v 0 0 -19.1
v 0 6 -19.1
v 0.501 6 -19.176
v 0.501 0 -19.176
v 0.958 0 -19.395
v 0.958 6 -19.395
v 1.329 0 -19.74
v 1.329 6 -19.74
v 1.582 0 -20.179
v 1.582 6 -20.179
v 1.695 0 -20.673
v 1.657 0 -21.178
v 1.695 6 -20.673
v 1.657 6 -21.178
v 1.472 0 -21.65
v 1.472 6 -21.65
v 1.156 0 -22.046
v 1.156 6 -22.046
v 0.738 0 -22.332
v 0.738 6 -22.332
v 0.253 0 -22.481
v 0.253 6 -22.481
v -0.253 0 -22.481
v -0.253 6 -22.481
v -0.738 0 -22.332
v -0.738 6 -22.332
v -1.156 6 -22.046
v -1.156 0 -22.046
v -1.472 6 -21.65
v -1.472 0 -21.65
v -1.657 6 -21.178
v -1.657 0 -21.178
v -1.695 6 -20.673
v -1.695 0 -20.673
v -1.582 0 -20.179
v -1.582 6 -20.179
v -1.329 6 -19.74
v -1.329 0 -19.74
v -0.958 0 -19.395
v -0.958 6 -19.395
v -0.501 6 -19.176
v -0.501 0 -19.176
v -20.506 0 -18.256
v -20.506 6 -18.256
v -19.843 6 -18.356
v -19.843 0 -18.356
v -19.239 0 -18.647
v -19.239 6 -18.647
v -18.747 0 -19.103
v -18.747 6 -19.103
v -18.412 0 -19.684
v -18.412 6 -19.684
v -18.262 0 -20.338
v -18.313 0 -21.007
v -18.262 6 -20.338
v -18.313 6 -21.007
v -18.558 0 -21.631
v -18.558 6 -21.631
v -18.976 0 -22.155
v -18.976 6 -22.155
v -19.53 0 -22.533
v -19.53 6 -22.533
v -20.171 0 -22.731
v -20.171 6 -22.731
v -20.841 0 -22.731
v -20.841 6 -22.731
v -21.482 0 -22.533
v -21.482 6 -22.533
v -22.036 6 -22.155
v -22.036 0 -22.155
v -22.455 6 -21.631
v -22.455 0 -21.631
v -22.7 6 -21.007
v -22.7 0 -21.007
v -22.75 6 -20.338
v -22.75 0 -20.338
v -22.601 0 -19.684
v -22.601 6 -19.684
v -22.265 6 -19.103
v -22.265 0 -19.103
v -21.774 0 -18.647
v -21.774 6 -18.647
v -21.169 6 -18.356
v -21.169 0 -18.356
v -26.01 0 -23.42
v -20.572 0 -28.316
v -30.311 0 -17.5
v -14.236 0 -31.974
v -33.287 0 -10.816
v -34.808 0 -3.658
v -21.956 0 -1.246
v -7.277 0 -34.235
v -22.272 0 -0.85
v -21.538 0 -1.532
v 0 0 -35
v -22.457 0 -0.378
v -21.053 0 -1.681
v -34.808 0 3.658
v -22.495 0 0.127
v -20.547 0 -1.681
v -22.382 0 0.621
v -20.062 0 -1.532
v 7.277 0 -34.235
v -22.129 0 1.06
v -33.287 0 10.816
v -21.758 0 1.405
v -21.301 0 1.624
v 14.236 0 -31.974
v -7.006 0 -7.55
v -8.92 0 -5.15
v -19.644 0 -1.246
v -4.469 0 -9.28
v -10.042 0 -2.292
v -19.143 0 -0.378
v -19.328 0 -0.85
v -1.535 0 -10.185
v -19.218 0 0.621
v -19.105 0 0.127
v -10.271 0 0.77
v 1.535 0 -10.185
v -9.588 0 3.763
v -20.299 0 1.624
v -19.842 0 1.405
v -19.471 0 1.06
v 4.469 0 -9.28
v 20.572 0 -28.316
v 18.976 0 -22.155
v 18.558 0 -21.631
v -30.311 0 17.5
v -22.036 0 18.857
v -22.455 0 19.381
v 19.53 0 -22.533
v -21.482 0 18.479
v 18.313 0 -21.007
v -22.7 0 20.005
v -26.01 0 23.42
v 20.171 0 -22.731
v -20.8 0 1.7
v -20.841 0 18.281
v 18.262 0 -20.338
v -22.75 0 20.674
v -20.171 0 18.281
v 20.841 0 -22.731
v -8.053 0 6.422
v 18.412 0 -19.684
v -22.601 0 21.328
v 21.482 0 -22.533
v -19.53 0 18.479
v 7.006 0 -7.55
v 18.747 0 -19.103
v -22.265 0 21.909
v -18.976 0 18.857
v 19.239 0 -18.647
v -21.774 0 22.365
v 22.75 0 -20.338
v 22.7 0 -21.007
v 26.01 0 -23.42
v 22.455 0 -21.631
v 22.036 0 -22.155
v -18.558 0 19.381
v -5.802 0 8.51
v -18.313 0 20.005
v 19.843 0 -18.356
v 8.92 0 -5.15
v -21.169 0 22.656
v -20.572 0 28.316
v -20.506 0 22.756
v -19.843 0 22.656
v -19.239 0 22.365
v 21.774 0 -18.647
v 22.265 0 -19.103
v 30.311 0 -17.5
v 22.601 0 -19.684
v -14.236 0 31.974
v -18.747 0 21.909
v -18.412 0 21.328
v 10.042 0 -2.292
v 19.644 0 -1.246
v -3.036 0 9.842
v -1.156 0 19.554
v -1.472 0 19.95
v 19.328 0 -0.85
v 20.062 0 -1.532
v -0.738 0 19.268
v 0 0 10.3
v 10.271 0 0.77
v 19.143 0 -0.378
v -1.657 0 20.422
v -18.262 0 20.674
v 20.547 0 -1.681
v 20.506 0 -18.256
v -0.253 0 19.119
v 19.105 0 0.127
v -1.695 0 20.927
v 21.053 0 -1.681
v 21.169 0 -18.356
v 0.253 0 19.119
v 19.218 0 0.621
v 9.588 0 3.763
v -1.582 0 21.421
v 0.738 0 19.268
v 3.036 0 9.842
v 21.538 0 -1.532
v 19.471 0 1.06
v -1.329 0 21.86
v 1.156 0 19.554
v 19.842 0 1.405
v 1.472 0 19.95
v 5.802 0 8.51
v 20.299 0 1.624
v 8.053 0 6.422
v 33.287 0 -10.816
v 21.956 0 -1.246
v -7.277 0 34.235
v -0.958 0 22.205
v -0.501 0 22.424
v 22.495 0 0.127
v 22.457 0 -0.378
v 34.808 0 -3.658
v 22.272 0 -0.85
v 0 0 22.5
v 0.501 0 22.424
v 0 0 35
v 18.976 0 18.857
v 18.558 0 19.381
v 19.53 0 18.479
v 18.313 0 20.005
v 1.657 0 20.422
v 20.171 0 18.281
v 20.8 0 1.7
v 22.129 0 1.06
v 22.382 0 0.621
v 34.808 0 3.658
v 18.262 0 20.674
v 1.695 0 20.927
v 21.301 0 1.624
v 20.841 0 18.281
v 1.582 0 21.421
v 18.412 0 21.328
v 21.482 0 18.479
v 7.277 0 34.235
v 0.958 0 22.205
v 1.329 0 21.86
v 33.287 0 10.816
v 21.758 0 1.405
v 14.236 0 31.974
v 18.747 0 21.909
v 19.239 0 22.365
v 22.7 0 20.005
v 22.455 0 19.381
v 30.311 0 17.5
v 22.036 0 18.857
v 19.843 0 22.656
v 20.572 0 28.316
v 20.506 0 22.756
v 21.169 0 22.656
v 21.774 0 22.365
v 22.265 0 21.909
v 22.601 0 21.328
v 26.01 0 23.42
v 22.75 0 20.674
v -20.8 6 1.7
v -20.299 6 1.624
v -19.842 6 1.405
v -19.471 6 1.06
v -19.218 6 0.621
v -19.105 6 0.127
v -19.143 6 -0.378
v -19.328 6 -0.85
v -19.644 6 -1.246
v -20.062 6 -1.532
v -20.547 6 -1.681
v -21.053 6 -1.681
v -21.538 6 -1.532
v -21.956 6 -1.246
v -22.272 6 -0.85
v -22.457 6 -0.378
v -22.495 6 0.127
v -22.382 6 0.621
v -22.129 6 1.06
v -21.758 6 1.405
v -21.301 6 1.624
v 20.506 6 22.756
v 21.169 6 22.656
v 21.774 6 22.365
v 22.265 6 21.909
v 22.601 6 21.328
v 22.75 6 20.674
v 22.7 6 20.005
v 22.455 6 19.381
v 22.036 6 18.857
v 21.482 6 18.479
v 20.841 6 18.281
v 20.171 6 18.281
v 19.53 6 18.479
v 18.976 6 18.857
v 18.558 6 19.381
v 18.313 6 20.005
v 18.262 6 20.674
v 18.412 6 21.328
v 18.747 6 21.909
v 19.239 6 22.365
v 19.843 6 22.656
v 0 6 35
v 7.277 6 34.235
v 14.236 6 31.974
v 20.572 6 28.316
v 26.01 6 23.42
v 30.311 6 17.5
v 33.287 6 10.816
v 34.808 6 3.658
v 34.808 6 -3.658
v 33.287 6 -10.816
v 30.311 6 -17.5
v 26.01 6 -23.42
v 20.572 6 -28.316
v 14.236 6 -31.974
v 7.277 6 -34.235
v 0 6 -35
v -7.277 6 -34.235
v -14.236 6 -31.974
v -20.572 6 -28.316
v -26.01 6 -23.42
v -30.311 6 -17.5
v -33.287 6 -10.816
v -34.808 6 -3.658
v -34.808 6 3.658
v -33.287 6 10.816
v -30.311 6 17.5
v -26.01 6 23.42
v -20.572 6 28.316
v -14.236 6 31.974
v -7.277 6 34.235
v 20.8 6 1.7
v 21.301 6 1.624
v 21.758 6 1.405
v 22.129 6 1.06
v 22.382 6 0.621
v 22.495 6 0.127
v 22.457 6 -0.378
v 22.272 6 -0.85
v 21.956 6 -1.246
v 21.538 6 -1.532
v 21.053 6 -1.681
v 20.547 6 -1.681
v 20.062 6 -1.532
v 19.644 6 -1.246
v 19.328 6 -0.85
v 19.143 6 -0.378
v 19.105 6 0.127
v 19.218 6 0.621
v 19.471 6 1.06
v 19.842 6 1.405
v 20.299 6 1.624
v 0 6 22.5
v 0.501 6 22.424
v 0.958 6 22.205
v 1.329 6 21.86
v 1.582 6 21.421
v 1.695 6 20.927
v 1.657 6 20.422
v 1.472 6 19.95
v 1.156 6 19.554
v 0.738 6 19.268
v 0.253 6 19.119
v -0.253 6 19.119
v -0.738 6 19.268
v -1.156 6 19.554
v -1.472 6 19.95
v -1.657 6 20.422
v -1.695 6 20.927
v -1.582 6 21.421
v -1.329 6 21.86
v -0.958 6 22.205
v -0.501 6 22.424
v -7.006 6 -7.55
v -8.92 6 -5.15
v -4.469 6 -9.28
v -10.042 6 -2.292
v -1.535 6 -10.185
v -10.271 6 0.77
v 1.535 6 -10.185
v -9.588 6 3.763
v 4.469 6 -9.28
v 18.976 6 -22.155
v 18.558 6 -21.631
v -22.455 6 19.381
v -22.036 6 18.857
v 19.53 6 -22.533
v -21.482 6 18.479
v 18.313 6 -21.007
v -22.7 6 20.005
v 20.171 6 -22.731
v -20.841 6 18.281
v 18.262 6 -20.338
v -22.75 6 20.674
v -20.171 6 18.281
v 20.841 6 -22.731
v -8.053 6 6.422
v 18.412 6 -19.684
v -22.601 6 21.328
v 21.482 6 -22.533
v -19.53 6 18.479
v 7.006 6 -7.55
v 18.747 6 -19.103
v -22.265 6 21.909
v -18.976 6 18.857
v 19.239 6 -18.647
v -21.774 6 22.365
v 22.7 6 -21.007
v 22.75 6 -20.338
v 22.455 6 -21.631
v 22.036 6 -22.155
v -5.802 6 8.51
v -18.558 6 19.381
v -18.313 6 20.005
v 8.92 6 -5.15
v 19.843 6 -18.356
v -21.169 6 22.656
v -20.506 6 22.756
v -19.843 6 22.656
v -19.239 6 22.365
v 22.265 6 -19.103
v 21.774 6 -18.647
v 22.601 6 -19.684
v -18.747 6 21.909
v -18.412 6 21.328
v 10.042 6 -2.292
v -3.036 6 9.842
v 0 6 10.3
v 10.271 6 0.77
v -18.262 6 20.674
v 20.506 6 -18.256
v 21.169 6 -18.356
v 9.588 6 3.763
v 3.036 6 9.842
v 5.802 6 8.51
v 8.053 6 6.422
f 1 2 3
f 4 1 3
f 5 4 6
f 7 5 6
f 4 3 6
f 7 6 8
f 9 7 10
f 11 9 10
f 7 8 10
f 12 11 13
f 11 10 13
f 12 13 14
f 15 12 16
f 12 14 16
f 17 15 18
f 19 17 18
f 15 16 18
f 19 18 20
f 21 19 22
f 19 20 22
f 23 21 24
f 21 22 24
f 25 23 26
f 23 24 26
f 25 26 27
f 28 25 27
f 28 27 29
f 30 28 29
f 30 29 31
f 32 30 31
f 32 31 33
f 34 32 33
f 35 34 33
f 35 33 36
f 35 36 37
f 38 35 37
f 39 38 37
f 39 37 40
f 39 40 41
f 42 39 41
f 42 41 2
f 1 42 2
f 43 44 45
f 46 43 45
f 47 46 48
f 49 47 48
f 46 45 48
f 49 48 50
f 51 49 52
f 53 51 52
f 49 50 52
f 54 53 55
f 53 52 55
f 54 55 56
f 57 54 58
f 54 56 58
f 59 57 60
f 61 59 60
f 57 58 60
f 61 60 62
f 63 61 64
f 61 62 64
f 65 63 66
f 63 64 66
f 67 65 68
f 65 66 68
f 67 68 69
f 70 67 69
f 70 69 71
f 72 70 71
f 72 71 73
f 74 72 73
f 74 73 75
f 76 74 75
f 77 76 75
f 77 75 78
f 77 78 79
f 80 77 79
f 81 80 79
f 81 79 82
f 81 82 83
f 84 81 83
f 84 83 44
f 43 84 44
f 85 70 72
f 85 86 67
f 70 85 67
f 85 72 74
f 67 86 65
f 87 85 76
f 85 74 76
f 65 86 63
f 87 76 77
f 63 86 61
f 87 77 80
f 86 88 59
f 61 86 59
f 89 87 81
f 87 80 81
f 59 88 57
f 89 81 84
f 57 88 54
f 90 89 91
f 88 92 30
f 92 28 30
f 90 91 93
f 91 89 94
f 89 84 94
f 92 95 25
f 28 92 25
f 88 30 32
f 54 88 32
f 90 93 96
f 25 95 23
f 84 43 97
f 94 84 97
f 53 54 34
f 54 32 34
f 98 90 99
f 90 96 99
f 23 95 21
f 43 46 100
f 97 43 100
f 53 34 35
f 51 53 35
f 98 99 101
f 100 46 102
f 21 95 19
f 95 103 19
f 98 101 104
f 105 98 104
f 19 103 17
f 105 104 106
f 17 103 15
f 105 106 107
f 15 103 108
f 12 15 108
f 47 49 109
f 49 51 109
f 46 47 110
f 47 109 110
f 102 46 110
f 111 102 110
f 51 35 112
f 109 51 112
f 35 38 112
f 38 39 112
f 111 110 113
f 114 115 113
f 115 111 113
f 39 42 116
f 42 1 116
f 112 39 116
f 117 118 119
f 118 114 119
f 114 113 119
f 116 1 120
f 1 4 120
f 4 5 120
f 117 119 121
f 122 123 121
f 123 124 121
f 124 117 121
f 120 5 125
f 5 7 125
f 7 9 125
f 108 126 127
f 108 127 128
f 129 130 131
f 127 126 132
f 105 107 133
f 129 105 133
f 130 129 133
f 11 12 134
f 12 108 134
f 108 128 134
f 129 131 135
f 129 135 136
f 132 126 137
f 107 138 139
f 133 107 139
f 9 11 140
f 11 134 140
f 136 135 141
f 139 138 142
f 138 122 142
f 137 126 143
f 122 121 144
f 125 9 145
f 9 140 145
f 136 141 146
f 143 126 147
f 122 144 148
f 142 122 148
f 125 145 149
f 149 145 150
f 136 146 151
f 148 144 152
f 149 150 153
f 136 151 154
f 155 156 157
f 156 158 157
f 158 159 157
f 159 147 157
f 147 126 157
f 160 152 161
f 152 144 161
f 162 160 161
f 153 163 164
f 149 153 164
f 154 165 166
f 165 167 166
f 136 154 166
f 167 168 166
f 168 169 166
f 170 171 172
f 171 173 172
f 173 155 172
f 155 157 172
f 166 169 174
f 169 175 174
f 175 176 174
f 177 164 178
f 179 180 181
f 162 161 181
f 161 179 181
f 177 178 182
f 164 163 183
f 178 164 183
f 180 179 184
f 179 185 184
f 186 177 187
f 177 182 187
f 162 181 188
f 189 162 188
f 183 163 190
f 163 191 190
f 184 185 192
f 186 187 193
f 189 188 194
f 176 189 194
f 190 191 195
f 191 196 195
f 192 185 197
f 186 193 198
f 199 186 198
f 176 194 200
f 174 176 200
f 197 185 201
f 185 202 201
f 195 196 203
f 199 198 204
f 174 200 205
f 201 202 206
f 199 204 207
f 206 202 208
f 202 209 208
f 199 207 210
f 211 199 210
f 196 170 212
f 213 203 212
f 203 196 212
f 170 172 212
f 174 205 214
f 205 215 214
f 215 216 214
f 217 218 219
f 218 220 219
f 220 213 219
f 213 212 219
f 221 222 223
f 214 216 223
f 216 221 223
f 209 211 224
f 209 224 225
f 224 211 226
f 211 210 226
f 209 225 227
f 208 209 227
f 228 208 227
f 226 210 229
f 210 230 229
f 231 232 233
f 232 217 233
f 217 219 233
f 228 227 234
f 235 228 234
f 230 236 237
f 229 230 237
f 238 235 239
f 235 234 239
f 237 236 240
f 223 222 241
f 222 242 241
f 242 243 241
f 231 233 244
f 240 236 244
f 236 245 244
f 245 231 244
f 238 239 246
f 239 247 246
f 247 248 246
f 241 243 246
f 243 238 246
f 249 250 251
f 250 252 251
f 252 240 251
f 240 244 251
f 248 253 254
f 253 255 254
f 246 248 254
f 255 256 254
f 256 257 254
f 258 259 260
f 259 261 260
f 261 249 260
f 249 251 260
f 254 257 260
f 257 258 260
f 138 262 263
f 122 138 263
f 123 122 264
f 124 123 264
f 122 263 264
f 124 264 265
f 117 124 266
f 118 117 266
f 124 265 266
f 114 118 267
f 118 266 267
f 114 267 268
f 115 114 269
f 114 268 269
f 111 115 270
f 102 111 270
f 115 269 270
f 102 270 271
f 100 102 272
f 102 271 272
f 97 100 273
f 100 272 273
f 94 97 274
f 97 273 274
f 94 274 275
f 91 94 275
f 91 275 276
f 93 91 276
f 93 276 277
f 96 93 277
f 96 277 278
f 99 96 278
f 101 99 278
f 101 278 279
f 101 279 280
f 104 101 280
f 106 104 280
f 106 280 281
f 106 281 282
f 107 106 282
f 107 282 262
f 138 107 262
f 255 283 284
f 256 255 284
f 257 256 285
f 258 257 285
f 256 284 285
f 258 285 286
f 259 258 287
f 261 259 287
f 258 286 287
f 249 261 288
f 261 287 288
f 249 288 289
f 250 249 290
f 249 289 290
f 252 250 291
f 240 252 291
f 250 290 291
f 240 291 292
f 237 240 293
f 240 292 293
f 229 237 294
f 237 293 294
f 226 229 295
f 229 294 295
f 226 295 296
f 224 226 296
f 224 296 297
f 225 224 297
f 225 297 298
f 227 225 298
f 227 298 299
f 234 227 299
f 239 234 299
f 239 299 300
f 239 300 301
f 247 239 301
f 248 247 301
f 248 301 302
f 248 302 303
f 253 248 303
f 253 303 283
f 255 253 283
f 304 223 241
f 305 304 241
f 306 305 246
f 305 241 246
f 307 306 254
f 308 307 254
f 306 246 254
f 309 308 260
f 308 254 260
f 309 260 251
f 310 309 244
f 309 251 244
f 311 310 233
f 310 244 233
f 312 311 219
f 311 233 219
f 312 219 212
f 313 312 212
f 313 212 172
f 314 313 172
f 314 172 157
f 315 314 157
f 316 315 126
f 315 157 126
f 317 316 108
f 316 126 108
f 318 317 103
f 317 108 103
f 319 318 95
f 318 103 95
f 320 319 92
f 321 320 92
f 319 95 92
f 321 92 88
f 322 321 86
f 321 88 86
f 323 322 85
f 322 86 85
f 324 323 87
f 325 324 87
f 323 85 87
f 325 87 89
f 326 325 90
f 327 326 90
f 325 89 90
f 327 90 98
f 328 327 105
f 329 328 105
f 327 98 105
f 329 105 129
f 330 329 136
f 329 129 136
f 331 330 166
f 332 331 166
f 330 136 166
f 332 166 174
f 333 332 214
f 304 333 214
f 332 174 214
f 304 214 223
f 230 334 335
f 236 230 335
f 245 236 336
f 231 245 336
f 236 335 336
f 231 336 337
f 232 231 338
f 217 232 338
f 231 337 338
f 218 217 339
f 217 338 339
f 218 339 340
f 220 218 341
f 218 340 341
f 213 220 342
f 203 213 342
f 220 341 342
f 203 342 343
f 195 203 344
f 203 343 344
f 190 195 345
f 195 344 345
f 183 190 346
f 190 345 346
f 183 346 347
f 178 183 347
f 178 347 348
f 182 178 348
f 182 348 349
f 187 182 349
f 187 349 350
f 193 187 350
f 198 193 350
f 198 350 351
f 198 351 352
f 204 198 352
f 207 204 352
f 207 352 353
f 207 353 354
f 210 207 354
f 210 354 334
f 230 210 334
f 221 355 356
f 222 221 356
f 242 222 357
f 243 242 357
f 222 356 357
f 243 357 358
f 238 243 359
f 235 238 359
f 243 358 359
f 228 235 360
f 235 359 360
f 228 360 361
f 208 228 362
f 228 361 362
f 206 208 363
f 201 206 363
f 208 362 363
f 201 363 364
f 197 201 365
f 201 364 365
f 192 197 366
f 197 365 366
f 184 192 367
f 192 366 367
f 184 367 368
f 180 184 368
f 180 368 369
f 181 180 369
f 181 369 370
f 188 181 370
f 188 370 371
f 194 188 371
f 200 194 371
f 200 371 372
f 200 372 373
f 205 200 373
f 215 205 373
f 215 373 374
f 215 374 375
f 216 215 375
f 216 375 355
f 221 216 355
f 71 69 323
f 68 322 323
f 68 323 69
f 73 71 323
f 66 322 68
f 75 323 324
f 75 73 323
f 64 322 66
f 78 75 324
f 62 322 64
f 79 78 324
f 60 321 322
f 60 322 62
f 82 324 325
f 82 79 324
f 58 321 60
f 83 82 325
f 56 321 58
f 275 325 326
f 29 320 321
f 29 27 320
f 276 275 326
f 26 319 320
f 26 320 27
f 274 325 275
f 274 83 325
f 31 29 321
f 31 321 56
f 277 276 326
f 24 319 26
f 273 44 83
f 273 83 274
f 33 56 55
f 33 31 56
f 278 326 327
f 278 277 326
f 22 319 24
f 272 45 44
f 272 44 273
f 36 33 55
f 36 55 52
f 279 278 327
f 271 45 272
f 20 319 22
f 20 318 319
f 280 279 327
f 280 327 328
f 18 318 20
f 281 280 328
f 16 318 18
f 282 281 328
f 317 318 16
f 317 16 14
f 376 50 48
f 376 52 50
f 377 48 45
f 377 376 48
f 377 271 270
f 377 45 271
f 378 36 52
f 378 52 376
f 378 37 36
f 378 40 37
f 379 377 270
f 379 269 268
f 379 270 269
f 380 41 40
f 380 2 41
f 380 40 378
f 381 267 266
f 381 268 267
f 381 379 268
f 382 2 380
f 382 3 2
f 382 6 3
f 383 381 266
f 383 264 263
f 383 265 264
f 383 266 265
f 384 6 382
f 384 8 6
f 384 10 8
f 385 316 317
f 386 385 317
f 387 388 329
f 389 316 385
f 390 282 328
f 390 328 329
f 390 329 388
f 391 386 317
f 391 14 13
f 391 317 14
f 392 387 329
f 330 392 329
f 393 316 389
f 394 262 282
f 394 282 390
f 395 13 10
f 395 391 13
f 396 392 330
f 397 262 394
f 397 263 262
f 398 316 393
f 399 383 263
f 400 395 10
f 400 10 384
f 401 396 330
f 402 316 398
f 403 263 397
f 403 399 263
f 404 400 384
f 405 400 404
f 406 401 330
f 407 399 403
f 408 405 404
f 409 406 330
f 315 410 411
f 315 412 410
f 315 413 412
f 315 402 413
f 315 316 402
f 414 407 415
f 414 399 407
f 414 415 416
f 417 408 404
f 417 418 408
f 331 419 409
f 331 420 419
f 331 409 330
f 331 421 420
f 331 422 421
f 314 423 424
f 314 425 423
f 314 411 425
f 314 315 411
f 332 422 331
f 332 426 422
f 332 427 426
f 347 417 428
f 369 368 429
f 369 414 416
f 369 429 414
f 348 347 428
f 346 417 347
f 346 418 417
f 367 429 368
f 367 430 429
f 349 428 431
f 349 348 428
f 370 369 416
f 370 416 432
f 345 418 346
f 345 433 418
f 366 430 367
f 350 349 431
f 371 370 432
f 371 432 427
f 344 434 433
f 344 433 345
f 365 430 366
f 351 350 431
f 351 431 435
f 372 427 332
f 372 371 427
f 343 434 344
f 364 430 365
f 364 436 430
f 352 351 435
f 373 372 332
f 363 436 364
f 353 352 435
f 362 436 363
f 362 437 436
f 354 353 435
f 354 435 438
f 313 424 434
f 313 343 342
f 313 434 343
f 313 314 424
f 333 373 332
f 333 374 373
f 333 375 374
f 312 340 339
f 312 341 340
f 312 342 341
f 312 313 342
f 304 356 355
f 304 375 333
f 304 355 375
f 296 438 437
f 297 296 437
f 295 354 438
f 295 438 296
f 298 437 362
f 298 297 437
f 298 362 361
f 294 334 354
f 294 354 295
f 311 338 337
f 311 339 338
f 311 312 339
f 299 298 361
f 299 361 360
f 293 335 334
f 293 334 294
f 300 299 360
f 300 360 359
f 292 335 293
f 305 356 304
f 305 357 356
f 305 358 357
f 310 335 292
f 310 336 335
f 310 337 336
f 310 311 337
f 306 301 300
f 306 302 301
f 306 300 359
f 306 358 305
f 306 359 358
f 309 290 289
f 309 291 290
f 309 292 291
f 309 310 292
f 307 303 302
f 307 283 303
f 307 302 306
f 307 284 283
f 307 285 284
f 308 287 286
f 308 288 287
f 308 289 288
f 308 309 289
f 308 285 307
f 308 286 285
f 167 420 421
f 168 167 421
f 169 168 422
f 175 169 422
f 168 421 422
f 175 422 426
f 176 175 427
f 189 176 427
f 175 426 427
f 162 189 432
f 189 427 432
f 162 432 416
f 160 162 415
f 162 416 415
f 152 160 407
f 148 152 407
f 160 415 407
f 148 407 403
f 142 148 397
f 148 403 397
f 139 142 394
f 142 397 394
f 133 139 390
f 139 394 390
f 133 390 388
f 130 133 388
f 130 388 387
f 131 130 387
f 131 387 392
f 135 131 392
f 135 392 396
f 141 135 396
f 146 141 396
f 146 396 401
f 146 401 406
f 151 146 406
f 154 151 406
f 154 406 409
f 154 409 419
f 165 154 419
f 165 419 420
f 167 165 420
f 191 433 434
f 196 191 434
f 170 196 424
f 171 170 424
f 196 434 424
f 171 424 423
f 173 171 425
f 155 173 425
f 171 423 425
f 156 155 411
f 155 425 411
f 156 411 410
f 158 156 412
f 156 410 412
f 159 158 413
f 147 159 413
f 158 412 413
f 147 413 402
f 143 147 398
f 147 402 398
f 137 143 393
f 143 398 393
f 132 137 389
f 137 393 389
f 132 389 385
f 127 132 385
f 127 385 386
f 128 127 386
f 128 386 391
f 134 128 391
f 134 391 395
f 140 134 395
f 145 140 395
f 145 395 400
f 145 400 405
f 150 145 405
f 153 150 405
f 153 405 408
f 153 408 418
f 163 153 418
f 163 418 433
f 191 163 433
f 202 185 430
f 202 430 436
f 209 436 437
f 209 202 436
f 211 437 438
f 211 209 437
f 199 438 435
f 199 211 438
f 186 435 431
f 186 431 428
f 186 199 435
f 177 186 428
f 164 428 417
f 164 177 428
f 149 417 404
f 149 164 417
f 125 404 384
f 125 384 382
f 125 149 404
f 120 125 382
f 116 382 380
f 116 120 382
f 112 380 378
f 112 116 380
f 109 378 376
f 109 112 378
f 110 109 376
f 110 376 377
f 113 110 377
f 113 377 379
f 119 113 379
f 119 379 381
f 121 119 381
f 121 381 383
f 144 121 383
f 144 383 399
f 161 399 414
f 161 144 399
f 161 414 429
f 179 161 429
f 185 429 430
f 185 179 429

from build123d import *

# Parameters (mm, degrees)
SKETCH1_R           = 35
SKETCH1_R_2         = 10.3
BOSS_EXTRUDE1_DEPTH = 6
SKETCH3_R           = 1.7
CUT_EXTRUDE1_DEPTH  = 50.859803449
SKETCH5_R           = 2.25
CUT_EXTRUDE2_DEPTH  = 50.859803449


with BuildPart() as part:
    # Sketch1 → Boss-Extrude1 (new body)
    with BuildSketch(Plane(origin=(0, 0, 0), x_dir=(1, 0, 0), z_dir=(0, 1, 0))):
        with Locations(Location((0, 0, 0), (0, 0, 270))):
            Circle(SKETCH1_R)
        with Locations(Location((0, 0, 0), (0, 0, 270))):
            Circle(SKETCH1_R_2, mode=Mode.SUBTRACT)
    extrude(amount=BOSS_EXTRUDE1_DEPTH)

    # Sketch3 → Cut-Extrude1 (cut, through all)
    with BuildSketch(Plane(origin=(0, 6, 0), x_dir=(1, 0, 0), z_dir=(0, 1, 0))):
        with Locations(Location((-20.8, 0, 0), (0, 0, 270))):
            Circle(SKETCH3_R)
        with Locations(Location((0, 20.8, 0), (0, 0, 270))):
            Circle(SKETCH3_R)
        with Locations(Location((20.8, 0, 0), (0, 0, 270))):
            Circle(SKETCH3_R)
        with Locations(Location((0, -20.8, 0), (0, 0, 270))):
            Circle(SKETCH3_R)
    extrude(amount=-CUT_EXTRUDE1_DEPTH, mode=Mode.SUBTRACT)

    # Sketch5 → Cut-Extrude2 (cut, through all)
    with BuildSketch(Plane(origin=(0, 6, 0), x_dir=(1, 0, 0), z_dir=(0, 1, 0))):
        with Locations(Location((-20.506096654, 20.506096654, 0), (0, 0, 270))):
            Circle(SKETCH5_R)
        with Locations(Location((-20.506096654, -20.506096654, 0), (0, 0, 270))):
            Circle(SKETCH5_R)
        with Locations(Location((20.506096654, 20.506096654, 0), (0, 0, 270))):
            Circle(SKETCH5_R)
        with Locations(Location((20.506096654, -20.506096654, 0), (0, 0, 270))):
            Circle(SKETCH5_R)
    extrude(amount=-CUT_EXTRUDE2_DEPTH, mode=Mode.SUBTRACT)


solid = part.part
